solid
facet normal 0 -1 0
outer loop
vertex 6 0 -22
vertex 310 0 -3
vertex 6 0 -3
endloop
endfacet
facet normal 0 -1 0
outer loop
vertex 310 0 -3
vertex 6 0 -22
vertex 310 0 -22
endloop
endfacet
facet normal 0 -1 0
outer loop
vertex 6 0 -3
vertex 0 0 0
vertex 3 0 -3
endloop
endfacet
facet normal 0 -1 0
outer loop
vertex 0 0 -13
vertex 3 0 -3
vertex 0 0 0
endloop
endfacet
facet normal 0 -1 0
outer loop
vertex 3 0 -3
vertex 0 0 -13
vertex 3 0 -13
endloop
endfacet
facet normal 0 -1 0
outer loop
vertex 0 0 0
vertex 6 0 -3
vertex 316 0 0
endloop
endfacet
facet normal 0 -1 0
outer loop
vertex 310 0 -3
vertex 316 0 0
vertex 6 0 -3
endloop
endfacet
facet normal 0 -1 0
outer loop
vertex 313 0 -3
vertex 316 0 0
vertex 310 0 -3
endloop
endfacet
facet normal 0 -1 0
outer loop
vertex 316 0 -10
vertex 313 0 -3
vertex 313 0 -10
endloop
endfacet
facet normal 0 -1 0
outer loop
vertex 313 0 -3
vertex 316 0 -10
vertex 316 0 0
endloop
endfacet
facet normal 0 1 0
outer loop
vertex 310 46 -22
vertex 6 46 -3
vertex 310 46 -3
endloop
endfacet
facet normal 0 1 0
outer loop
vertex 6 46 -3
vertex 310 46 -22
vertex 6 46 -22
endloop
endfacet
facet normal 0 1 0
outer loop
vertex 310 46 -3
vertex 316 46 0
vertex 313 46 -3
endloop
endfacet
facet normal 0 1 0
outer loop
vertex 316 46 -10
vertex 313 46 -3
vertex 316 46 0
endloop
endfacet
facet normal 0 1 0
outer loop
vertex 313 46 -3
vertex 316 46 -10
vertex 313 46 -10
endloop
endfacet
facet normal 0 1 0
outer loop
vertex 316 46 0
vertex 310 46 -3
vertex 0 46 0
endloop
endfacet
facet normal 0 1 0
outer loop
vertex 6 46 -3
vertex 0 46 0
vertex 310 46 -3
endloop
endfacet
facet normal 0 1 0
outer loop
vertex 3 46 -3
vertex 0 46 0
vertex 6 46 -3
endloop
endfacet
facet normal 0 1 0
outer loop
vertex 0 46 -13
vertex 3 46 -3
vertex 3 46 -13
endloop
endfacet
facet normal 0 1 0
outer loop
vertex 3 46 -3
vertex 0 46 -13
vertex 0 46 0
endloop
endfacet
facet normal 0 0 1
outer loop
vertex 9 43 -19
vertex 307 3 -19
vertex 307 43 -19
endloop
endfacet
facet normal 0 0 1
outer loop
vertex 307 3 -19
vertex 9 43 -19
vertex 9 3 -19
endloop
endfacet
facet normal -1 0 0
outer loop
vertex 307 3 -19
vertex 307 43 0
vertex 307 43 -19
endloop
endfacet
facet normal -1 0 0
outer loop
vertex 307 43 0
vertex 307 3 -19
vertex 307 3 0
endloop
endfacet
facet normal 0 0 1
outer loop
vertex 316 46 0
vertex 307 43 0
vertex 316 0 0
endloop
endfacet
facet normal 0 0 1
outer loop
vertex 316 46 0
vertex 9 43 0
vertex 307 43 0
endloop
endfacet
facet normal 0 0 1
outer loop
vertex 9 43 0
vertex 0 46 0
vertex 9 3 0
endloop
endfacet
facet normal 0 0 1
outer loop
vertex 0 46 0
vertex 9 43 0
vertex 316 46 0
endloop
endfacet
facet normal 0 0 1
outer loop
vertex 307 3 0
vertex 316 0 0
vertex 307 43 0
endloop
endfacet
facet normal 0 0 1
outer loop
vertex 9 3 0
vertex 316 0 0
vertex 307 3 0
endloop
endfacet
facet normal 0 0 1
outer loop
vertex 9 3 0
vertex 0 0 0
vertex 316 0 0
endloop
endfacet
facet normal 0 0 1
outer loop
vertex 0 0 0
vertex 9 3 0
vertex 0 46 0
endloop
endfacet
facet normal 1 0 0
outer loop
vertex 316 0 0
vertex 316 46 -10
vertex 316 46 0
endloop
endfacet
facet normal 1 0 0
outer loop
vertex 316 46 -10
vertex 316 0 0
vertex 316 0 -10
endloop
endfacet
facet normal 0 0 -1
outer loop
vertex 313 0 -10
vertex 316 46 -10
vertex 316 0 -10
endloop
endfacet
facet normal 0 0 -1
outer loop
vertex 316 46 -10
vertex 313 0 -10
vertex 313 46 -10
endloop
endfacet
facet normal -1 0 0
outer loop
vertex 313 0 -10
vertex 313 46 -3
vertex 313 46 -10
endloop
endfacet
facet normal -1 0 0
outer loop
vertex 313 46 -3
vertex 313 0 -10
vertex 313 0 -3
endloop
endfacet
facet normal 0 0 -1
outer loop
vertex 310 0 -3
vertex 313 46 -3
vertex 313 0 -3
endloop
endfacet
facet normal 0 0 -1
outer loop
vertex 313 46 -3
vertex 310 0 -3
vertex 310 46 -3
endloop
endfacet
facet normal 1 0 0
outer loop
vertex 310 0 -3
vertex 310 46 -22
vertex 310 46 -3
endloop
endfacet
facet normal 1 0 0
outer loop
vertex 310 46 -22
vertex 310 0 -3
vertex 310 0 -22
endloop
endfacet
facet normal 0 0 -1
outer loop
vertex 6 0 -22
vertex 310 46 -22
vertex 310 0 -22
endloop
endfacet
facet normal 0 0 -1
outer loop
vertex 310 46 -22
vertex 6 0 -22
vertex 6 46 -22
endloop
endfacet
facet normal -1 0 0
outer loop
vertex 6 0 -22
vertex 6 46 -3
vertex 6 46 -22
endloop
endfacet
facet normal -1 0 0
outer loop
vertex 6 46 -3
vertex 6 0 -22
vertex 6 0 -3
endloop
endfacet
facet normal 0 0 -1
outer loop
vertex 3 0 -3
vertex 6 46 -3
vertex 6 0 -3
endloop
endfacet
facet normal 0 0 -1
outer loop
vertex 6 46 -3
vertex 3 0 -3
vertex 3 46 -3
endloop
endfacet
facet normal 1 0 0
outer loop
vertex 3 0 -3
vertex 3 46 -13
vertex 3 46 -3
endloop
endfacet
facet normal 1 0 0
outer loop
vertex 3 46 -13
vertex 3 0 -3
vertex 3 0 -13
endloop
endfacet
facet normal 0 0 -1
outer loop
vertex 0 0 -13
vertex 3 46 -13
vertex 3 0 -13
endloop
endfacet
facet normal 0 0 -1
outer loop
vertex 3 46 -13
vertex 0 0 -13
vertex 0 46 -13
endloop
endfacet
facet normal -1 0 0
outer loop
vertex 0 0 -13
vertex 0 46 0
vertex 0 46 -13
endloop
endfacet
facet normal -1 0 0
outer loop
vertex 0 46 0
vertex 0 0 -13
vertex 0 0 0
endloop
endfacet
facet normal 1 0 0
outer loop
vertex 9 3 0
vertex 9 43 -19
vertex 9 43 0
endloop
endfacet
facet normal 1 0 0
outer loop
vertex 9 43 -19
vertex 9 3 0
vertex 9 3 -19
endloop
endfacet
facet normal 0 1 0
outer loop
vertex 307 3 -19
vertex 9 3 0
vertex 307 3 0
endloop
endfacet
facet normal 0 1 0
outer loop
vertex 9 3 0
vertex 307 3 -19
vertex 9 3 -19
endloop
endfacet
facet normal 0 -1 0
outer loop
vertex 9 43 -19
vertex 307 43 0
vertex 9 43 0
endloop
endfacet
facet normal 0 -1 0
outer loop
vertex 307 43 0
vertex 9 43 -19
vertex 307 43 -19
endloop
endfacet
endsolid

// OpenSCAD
// The thickness of the shell and its sides (in mm).
thickness = 3; // [2:8]

// The depth of the sides that will be on the outsides of the drawers (in mm).
sideDepth = 10; // [5:25]

// The depth of the inside of the tray (in mm).
trayDepth = 19; // [5:200]

// The width of the tray (in mm).
trayWidth = 40; // [20:200]

// An offset applied to angle the bottom of the tray inwards, creating slight slopes on the left and right side (in mm).
offset = 0; // [0:10]

// Print with the bottom of the tray on the print bed (if possible).
printBottomDown = true;

{}

// Parameters for the US General Series 2 Drawers
$drawerID = 304; // 20250930: 302-305mm
$drawerOD = 310; // 20250930: 310-312mm ... Might need to take many more measurements if people have fit issues.

$metal = ($drawerOD - $drawerID) / 2;

// The points that make up the tray's body/shape.
$trayPoints=[
    [0,0],
    [thickness + $metal + thickness, 0],
    [thickness + $metal + thickness + offset, trayDepth],
    [thickness + $metal + thickness + ($drawerID - thickness * 2 - offset), trayDepth],
    [thickness + $metal + thickness + ($drawerID - thickness * 2), 0],

    [(thickness + $metal + thickness) * 2 + ($drawerID - thickness * 2), 0],
    [(thickness + $metal + thickness) * 2 + ($drawerID - thickness * 2), sideDepth],
    [thickness * 2 + $metal * 2 + thickness + ($drawerID - thickness * 2), sideDepth],
    [thickness * 2 + $metal * 2 + thickness + ($drawerID - thickness * 2), thickness],
    [thickness * 2 + $metal + thickness + ($drawerID - thickness * 2), thickness],

    [thickness + $metal + $drawerID - offset, thickness + trayDepth],
    [thickness + $metal + offset, thickness + trayDepth],
    [thickness + $metal, thickness],
    [thickness, thickness],
    [thickness, thickness+sideDepth],

    [0, thickness+sideDepth],
];

// The sides of the tray.
$sides = [
    [0, 0],
    [$drawerID, 0],
    [$drawerID - offset,trayDepth + thickness],
    [offset, trayDepth + thickness],
];


$finalRotation = printBottomDown ? -90 : 0;

rotate([$finalRotation,0,0])
group() {
    linear_extrude(trayWidth + thickness * 2)
    polygon($trayPoints);

    translate([thickness + $metal, 0, 0])
    linear_extrude(thickness)
    polygon($sides);

    translate([thickness + $metal, 0, trayWidth + thickness])
    linear_extrude(thickness)
    polygon($sides);
}
